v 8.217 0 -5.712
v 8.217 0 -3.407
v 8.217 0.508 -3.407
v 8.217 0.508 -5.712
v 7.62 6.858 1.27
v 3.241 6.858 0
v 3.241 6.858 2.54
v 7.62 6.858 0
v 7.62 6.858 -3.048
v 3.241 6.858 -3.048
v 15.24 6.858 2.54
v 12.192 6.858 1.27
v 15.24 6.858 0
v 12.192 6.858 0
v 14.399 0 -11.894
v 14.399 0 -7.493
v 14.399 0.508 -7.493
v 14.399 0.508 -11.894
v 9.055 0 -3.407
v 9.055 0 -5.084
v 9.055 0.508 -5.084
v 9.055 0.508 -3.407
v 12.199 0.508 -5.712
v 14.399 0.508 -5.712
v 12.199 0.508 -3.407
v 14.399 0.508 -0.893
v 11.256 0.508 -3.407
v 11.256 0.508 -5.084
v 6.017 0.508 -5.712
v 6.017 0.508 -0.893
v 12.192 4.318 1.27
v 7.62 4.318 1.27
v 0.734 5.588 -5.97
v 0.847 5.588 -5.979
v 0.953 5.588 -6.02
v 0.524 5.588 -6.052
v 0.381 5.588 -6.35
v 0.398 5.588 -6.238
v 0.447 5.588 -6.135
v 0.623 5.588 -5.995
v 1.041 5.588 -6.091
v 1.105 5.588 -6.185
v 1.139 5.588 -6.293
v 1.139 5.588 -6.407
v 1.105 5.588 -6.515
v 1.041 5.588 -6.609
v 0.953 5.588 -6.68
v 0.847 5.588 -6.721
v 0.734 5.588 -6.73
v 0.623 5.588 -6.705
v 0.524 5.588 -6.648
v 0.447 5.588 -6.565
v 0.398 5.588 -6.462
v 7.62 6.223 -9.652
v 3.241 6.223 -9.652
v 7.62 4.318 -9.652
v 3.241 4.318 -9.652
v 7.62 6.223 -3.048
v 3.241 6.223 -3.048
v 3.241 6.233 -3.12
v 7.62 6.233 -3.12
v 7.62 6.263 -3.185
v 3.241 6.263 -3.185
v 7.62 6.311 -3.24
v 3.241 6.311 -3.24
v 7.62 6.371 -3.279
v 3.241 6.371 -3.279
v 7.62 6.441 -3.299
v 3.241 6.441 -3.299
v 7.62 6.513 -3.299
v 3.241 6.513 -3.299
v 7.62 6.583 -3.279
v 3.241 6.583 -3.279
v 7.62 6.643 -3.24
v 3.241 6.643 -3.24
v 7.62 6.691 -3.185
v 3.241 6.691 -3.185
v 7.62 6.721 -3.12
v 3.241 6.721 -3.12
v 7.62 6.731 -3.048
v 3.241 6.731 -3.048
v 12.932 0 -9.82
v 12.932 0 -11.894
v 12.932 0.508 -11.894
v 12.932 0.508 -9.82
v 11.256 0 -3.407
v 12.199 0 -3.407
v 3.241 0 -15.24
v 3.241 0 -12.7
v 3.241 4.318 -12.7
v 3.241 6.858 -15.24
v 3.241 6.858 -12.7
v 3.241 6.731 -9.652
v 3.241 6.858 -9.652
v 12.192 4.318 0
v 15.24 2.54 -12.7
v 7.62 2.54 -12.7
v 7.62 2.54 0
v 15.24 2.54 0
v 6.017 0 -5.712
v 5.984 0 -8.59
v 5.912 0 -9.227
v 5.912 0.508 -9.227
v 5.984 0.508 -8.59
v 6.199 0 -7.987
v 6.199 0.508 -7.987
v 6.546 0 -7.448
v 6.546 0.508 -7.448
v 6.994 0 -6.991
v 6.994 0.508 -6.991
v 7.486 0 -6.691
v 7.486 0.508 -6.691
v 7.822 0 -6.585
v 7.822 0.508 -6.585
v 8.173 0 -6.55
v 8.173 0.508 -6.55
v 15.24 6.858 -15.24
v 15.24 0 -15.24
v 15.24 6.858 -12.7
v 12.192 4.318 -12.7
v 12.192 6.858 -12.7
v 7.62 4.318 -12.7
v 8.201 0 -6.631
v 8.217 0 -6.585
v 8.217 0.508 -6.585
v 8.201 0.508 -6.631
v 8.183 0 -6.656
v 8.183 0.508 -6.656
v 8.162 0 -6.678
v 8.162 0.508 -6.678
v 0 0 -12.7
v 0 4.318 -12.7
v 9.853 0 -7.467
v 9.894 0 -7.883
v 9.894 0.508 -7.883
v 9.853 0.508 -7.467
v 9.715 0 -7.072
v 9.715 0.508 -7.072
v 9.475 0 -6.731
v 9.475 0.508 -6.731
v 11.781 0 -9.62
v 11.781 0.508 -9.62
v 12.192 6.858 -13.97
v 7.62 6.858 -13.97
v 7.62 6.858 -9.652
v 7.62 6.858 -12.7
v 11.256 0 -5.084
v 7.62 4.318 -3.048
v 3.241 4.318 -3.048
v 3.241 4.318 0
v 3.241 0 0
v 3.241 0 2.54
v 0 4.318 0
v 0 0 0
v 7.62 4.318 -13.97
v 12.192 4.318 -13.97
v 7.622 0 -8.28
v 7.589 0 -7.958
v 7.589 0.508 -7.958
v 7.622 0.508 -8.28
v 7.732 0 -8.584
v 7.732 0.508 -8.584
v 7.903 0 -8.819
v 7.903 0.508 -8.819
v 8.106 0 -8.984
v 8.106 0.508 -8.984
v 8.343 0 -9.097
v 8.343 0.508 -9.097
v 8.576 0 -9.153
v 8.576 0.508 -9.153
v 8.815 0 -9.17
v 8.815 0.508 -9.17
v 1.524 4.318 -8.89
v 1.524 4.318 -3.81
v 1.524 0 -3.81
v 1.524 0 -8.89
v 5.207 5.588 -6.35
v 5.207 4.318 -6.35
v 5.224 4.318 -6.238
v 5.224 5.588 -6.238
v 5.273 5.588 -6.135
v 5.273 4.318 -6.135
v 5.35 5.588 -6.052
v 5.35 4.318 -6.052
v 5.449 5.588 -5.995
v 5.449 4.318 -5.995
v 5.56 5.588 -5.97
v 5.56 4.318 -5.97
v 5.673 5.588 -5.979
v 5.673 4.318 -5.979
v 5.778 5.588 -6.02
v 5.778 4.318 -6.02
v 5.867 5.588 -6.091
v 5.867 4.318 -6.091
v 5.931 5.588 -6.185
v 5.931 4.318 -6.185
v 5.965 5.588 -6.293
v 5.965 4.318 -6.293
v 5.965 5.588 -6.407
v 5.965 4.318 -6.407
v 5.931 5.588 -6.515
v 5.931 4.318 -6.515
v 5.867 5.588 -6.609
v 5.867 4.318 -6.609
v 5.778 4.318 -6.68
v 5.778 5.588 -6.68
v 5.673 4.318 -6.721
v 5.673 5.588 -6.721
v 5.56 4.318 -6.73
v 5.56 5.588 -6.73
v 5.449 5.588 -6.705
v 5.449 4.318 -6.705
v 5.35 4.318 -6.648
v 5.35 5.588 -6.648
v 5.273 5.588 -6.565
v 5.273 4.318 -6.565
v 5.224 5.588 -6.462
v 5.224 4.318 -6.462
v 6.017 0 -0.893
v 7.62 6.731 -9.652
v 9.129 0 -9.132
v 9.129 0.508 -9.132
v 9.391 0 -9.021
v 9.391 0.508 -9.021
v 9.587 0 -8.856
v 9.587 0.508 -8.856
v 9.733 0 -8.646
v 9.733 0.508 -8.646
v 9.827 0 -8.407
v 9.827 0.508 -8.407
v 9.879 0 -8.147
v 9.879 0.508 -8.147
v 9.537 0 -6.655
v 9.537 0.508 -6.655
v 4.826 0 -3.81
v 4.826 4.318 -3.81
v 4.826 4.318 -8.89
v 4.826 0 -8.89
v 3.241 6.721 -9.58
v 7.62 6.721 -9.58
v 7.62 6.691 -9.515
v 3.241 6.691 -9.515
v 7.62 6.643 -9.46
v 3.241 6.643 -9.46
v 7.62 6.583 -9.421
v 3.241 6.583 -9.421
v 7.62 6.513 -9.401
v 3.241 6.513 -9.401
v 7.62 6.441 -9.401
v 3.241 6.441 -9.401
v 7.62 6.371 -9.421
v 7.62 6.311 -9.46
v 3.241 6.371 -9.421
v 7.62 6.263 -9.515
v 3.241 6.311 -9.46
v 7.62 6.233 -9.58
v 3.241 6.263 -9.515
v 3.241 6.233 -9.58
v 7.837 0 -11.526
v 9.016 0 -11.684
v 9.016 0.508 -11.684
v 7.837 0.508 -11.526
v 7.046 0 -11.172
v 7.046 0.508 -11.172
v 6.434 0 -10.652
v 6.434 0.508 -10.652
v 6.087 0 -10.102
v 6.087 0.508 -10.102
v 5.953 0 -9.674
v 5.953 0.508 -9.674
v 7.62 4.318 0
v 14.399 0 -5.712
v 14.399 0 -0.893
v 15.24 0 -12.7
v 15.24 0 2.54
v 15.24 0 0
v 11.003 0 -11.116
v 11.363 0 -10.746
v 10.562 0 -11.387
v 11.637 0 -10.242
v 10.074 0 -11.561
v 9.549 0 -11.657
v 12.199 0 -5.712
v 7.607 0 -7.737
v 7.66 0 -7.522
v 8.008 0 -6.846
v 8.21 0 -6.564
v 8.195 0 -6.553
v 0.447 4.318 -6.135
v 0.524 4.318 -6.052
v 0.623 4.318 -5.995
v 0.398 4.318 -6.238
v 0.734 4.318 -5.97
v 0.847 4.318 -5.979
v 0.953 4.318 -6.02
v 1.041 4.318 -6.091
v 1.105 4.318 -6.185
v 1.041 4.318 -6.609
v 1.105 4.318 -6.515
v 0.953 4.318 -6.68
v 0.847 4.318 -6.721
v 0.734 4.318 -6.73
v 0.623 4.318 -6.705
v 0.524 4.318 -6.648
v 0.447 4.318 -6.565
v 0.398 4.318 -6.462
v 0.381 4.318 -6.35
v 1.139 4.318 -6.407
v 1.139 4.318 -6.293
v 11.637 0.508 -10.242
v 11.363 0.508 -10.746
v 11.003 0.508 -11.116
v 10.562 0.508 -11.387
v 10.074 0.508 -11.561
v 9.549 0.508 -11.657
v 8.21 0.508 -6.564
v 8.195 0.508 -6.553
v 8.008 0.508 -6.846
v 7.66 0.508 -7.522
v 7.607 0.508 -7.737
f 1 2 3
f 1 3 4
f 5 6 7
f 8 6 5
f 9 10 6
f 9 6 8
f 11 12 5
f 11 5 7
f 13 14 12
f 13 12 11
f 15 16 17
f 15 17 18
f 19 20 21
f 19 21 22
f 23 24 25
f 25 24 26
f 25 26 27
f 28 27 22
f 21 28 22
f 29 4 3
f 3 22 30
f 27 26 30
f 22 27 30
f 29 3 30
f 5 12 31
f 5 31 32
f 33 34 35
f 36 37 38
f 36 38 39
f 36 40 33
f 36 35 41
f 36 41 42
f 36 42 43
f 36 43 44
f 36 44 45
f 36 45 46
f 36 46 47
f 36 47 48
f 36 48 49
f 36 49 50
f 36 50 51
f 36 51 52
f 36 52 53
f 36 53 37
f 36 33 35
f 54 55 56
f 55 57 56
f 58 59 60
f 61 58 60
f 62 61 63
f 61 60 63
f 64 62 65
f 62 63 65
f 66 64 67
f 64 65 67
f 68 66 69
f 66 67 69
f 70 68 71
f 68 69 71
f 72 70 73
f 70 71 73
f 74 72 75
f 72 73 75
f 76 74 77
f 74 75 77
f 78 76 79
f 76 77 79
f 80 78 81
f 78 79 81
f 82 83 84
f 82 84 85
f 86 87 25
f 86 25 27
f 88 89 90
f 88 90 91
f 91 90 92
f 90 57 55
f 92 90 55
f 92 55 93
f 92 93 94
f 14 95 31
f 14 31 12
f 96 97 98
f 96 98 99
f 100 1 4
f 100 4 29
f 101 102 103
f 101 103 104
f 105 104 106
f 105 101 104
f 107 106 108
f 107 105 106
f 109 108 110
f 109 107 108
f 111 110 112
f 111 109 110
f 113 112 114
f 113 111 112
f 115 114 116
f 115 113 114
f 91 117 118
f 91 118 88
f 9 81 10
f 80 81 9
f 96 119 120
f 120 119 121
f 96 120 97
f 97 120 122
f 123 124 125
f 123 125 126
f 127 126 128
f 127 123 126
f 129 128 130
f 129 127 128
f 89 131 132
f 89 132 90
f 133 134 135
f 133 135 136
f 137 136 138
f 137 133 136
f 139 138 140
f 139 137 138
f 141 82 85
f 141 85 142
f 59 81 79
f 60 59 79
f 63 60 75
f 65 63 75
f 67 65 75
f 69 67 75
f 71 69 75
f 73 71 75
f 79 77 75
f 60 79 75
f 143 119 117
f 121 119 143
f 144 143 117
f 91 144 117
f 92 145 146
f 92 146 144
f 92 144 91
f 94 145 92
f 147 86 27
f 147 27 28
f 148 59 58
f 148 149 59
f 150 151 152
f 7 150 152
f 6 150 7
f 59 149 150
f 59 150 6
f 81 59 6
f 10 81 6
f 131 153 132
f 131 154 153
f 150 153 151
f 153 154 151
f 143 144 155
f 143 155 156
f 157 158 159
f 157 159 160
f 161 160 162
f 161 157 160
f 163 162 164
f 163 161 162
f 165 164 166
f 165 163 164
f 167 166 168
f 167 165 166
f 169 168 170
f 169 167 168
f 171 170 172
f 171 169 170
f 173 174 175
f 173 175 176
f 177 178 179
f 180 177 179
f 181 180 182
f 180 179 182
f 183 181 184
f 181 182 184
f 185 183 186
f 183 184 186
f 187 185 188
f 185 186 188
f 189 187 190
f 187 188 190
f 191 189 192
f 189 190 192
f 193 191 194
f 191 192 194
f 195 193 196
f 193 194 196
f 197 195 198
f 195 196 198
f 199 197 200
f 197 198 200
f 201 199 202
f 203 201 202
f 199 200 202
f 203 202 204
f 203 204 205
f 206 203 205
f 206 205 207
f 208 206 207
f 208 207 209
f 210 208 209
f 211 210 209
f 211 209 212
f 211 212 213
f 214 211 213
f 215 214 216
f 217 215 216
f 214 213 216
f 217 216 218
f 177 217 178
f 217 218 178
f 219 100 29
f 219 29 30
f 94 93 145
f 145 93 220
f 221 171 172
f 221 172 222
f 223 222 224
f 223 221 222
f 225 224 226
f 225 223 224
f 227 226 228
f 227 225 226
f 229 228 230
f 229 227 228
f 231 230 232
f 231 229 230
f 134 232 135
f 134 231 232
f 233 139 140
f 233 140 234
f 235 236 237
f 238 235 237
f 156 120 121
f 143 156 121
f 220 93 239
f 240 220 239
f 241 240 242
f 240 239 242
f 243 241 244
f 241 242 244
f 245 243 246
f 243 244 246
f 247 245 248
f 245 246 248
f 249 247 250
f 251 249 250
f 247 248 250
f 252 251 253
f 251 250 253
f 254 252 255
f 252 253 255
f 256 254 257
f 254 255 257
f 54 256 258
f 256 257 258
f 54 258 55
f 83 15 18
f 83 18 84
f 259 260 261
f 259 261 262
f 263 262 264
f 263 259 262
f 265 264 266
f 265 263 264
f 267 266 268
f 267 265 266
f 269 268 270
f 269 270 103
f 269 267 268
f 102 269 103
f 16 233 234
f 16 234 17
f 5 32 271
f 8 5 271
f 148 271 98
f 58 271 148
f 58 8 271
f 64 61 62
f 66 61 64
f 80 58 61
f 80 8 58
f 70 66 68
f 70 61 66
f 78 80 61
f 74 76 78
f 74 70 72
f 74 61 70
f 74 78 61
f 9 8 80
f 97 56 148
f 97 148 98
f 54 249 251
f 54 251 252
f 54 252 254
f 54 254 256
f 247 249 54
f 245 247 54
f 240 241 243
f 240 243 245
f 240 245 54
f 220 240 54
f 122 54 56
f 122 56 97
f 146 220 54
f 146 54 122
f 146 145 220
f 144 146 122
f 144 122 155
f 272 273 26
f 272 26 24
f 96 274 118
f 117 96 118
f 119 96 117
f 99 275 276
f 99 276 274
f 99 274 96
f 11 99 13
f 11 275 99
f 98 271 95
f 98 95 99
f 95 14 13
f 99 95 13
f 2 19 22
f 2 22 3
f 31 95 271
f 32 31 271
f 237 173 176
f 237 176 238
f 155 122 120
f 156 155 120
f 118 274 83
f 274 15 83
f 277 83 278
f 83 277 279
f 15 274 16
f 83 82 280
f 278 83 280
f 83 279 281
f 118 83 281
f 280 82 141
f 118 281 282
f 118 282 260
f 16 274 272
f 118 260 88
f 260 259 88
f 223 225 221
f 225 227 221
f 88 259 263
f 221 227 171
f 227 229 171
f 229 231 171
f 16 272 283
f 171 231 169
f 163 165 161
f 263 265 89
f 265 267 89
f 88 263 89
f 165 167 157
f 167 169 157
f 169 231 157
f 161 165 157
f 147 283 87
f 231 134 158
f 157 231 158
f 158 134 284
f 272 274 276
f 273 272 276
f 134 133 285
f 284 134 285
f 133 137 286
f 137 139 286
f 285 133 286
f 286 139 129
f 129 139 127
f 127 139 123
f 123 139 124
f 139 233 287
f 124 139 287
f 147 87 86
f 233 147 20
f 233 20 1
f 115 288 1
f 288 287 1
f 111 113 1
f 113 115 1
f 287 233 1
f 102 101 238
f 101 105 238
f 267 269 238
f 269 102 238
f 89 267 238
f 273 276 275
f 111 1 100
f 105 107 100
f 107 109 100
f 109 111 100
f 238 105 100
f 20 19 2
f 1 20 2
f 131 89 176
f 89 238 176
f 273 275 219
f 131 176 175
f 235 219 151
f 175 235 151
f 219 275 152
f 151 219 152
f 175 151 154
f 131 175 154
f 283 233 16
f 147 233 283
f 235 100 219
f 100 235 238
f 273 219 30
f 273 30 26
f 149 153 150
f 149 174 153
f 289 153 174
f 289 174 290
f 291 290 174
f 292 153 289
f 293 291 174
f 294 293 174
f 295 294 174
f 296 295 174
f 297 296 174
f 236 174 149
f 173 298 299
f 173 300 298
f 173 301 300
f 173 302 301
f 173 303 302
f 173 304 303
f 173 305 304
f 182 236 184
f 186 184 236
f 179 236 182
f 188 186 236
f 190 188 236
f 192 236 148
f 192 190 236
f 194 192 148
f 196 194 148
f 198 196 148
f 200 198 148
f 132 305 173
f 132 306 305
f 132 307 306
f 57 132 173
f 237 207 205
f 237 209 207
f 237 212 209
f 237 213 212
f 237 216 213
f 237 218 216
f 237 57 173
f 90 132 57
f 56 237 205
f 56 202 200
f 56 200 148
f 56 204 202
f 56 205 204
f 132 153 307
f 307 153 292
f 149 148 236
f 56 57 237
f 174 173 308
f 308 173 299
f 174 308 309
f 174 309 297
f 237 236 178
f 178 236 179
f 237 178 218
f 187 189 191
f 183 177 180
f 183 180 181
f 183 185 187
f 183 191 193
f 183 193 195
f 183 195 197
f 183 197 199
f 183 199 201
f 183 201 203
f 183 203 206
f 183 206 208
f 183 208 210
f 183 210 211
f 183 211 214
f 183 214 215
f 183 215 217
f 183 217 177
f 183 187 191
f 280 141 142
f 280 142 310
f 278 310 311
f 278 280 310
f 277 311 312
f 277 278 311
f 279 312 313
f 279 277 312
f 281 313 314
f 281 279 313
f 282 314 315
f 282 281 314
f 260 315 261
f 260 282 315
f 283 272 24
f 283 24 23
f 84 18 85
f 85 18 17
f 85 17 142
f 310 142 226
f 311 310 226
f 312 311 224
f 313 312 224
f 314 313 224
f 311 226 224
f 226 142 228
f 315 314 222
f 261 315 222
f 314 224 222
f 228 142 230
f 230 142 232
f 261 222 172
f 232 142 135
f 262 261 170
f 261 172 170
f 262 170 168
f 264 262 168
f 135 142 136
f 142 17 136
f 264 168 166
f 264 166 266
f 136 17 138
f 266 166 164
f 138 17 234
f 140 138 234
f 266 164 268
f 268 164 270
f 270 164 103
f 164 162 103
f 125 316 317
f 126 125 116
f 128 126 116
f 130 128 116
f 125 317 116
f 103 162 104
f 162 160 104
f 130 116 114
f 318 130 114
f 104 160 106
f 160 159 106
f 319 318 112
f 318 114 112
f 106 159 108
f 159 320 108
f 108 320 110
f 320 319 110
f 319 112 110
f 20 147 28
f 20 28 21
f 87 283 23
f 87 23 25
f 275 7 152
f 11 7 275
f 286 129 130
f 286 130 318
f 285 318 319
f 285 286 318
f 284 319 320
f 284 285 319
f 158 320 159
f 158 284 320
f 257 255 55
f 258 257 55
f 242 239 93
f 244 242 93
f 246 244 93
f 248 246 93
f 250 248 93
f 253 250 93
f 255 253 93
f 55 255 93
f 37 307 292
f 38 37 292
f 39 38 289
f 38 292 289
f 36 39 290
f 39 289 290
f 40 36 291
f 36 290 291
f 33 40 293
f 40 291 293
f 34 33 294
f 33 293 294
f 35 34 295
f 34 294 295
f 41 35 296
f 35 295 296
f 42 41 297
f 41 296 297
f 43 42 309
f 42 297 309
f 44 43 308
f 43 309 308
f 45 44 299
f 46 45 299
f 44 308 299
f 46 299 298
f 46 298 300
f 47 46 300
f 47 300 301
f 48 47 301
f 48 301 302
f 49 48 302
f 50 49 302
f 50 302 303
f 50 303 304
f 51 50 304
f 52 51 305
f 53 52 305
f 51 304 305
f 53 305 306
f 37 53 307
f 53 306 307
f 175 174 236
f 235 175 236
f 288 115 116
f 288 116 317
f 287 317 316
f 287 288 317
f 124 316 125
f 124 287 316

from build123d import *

# Parameters (mm, degrees)
SKETCH1_W             = 15.24
SKETCH1_H             = 12.7
MAIN_BASE_DEPTH       = 2.54
ALIGNMENTPINS_START   = 1.778
SKETCH2_R             = 0.381
ALIGNMENTPINS_DEPTH   = 1.27
ALIGNMENTPINS_2_DEPTH = 1.27
SKETCH7_W             = 7.62
SKETCH7_H             = 12.7
PCBOARDEDGES_DEPTH    = 1.778
SKETCH12_W            = 4.379010271
SKETCH12_H            = 3.048
CONNECTORALIGN_DEPTH  = 2.54
SKETCH13_W            = 3.302
SKETCH13_H            = 5.08
LEDHOLE_DEPTH         = 5.318
SKETCH14_W            = 11.999010271
SKETCH14_H            = 6.858
SHOULDER_DEPTH        = 2.54
SKETCH15_W            = 11.999010271
SKETCH15_H            = 6.858
SHOULDER2_DEPTH       = 2.54
PCB_CLIP_START        = -4.37901
SKETCH17_R            = 0.254
PCB_CLIP_DEPTH        = 4.37901
SKETCH18_W            = 4.572
SKETCH18_H            = 2.54
NUNCHUCKCLIP_DEPTH    = 1.27
SKETCH19_W            = 4.572
SKETCH19_H            = 2.54
NUNCHUCKCLIP2_DEPTH   = 1.27
CUT_EXTRUDE1_DEPTH    = 0.508


with BuildPart() as part:
    # Sketch1 → Main Base (new body)
    with BuildSketch(Plane(origin=(0, 0, 0), x_dir=(1, 0, 0), z_dir=(0, 1, 0))):
        with Locations((7.62, 6.35)):
            Rectangle(SKETCH1_W, SKETCH1_H)
    extrude(amount=MAIN_BASE_DEPTH)



with BuildPart() as body_2:
    # Sketch2 → AlignmentPins (new body)
    with BuildSketch(Plane(origin=(0, 2.54, 0), x_dir=(-1, 0, 0), z_dir=(0, 1, 0)).offset(ALIGNMENTPINS_START)):
        with Locations((-0.762, -6.35)):
            Circle(SKETCH2_R)
    extrude(amount=ALIGNMENTPINS_DEPTH)


with BuildPart() as body_3:
    # Sketch2 → AlignmentPins 2 (new body)
    with BuildSketch(Plane(origin=(0, 2.54, 0), x_dir=(-1, 0, 0), z_dir=(0, 1, 0)).offset(ALIGNMENTPINS_START)):
        with Locations((-5.588, -6.35)):
            Circle(SKETCH2_R)
    extrude(amount=ALIGNMENTPINS_2_DEPTH)


with BuildPart() as part_1:
    add(part.part)

    add(body_2.part)  # PCBoardEdges merges body 2

    add(body_3.part)  # PCBoardEdges merges body 3
    # Sketch7 → PCBoardEdges (add)
    with BuildSketch(Plane(origin=(0, 2.54, 0), x_dir=(1, 0, 0), z_dir=(0, 1, 0))):
        with Locations((3.81, 6.35)):
            Rectangle(SKETCH7_W, SKETCH7_H)
    extrude(amount=PCBOARDEDGES_DEPTH)

    # Sketch12 → ConnectorAlign (add)
    with BuildSketch(Plane(origin=(0, 4.318, 0), x_dir=(1, 0, 0), z_dir=(0, 1, 0))):
        with Locations((5.430494864, 1.524)):
            Rectangle(SKETCH12_W, SKETCH12_H)
        with Locations((5.430494864, 11.176)):
            Rectangle(SKETCH12_W, SKETCH12_H)
    extrude(amount=CONNECTORALIGN_DEPTH)

    # Sketch13 → LEDHole (cut, through all)
    with BuildSketch(Plane(origin=(0, 4.318, 0), x_dir=(1, 0, 0), z_dir=(0, 1, 0))):
        with Locations((3.175, 6.35)):
            Rectangle(SKETCH13_W, SKETCH13_H)
    extrude(amount=-LEDHOLE_DEPTH, mode=Mode.SUBTRACT)

    # Sketch14 → Shoulder (add)
    with BuildSketch(Plane.XY):
        with Locations((9.240494865, 3.429)):
            Rectangle(SKETCH14_W, SKETCH14_H)
    extrude(amount=SHOULDER_DEPTH)

    # Sketch15 → Shoulder2 (add)
    with BuildSketch(Plane(origin=(0, 0, -12.7), x_dir=(-1, 0, 0), z_dir=(0, 0, -1))):
        with Locations((-9.240494865, 3.429)):
            Rectangle(SKETCH15_W, SKETCH15_H)
    extrude(amount=SHOULDER2_DEPTH)

    # Sketch17 → PCB_Clip (add)
    with BuildSketch(Plane(origin=(7.62, 0, 0), x_dir=(0, 0, -1), z_dir=(1, 0, 0)).offset(PCB_CLIP_START)):
        with Locations((3.048, 6.477)):
            Circle(SKETCH17_R)
        with Locations((9.652, 6.477)):
            Circle(SKETCH17_R)
    extrude(amount=PCB_CLIP_DEPTH)

    # Sketch18 → NunchuckClip (cut)
    with BuildSketch(Plane(origin=(0, 0, 0), x_dir=(-1, 0, 0), z_dir=(0, 0, -1))):
        with Locations((-9.906, 5.588)):
            Rectangle(SKETCH18_W, SKETCH18_H)
    extrude(amount=-NUNCHUCKCLIP_DEPTH, mode=Mode.SUBTRACT)

    # Sketch19 → NunchuckClip2 (cut)
    with BuildSketch(Plane.XY.offset(-12.7)):
        with Locations((9.906, 5.588)):
            Rectangle(SKETCH19_W, SKETCH19_H)
    extrude(amount=-NUNCHUCKCLIP2_DEPTH, mode=Mode.SUBTRACT)

    # Sketch20 → Cut-Extrude1 (cut)
    with BuildSketch(Plane.XZ):
        Polygon((8.217257779, -3.407193662), (8.217257779, -5.712243662), (6.016982779, -5.712243662), (6.016982779, -0.892593662), (14.398982779, -0.892593662), (14.398982779, -5.712243662), (12.198707779, -5.712243662), (12.198707779, -3.407193662), (11.255732779, -3.407193662), (11.255732779, -5.083593662), (9.055457779, -5.083593662), (9.055457779, -3.407193662), align=None)
        with BuildLine():
            Line((14.398982779, -7.493418662), (14.398982779, -11.893968662))
            Line((14.398982779, -11.893968662), (12.932132779, -11.893968662))
            Line((12.932132779, -11.893968662), (12.932132779, -9.819751084))
            Line((12.932132779, -9.819751084), (11.781244888, -9.62002374))
            add(Edge.make_bspline(
                [(11.781244888, -9.62002374), (11.770251243, -9.701615614), (11.748663963, -9.861830588), (11.690486481, -10.092391141), (11.615599165, -10.308891021), (11.520125231, -10.50985122), (11.405471862, -10.695560634), (11.270958242, -10.865311588), (11.120486873, -11.022229739), (10.949196623, -11.16103415), (10.761135353, -11.283987594), (10.557944594, -11.392930954), (10.337872373, -11.481879106), (10.102990479, -11.555971833), (9.853586477, -11.614857534), (9.588035638, -11.655012226), (9.307512918, -11.680069087), (9.114994844, -11.682943238), (9.016167154, -11.684418662)],
                knots=[0, 0, 0, 0, 0.000246818, 0.000484656, 0.000711955, 0.000933104, 0.001150717, 0.001365234, 0.001581735, 0.001801627, 0.002025024, 0.00225499, 0.002492123, 0.002735986, 0.002993304, 0.003260037, 0.003541058, 0.003837488, 0.003837488, 0.003837488, 0.003837488], degree=3))
            add(Edge.make_bspline(
                [(9.016167154, -11.684418662), (8.905845682, -11.682210565), (8.68961718, -11.677882727), (8.372872854, -11.644171577), (8.070289394, -11.591506566), (7.783499686, -11.513120981), (7.50963283, -11.418624818), (7.253853676, -11.294705499), (7.009895928, -11.155322531), (6.785472567, -10.99155228), (6.581476114, -10.81250602), (6.401376691, -10.621361865), (6.251345496, -10.416180814), (6.127577636, -10.200488598), (6.029896075, -9.973283881), (5.961530212, -9.734567465), (5.918899529, -9.48458455), (5.914467439, -9.314058562), (5.912207779, -9.22711749)],
                knots=[0, 0, 0, 0, 0.000330895, 0.000648549, 0.000954583, 0.00125123, 0.001539645, 0.00182231, 0.002102538, 0.002381539, 0.002654132, 0.002915916, 0.003167717, 0.003414839, 0.003660542, 0.00390768, 0.004158249, 0.004418878, 0.004418878, 0.004418878, 0.004418878], degree=3))
            add(Edge.make_bspline(
                [(5.912207779, -9.22711749), (5.91445515, -9.141879038), (5.918894654, -8.973497236), (5.952975516, -8.724244798), (6.006861153, -8.48157511), (6.081680985, -8.244815631), (6.181740166, -8.016042881), (6.300749021, -7.793180228), (6.443204901, -7.577175879), (6.60469356, -7.3712837), (6.778629295, -7.179505186), (6.962203599, -7.01236275), (7.15024709, -6.869703261), (7.343165184, -6.752025997), (7.544148349, -6.663616031), (7.748263448, -6.596817328), (7.959336029, -6.558322833), (8.101419593, -6.553084662), (8.173055826, -6.550443662)],
                knots=[0, 0, 0, 0, 0.000255646, 0.000505008, 0.000753251, 0.00100073, 0.001248584, 0.001501277, 0.001757823, 0.002023741, 0.002285618, 0.002533617, 0.002767397, 0.002992849, 0.00320977, 0.003424631, 0.003635926, 0.003850787, 0.003850787, 0.003850787, 0.003850787], degree=3))
            add(Edge.make_bspline(
                [(8.173055826, -6.550443662), (8.185703613, -6.55112084), (8.209065854, -6.552371684), (8.21468206, -6.574619572), (8.217257779, -6.584822959)],
                knots=[0, 0, 0, 0, 3.375e-05, 6.2341e-05, 6.2341e-05, 6.2341e-05, 6.2341e-05], degree=3))
            add(Edge.make_bspline(
                [(8.217257779, -6.584822959), (8.21379986, -6.598956726), (8.204910316, -6.635291506), (8.178023964, -6.661887625), (8.16159606, -6.678138193)],
                knots=[0, 0, 0, 0, 4.2972e-05, 0.000110472, 0.000110472, 0.000110472, 0.000110472], degree=3))
            add(Edge.make_bspline(
                [(8.16159606, -6.678138193), (8.136365772, -6.700405265), (8.077016572, -6.752784095), (7.993692338, -6.862131275), (7.902122779, -7.009388757), (7.800385555, -7.184339204), (7.708056874, -7.377085557), (7.639849213, -7.574659381), (7.596386201, -7.767637982), (7.591153517, -7.895938561), (7.588607779, -7.958357724)],
                knots=[0, 0, 0, 0, 0.000100772, 0.000237046, 0.000410069, 0.00062125, 0.000843879, 0.001049934, 0.0012474, 0.00143449, 0.00143449, 0.00143449, 0.00143449], degree=3))
            add(Edge.make_bspline(
                [(7.588607779, -7.958357724), (7.589364169, -8.003161205), (7.590845457, -8.090902724), (7.607861397, -8.218508769), (7.633961608, -8.339043342), (7.670022293, -8.453352628), (7.717335918, -8.560860294), (7.774738157, -8.661469601), (7.843243248, -8.754458019), (7.920801372, -8.840377114), (8.008056037, -8.917894183), (8.103416935, -8.984707761), (8.204925166, -9.042944891), (8.314460725, -9.087724989), (8.428623769, -9.127224479), (8.551689353, -9.149790175), (8.680576304, -9.167789672), (8.76943719, -9.169132909), (8.814802701, -9.169818662)],
                knots=[0, 0, 0, 0, 0.000134333, 0.000263072, 0.000385418, 0.000503982, 0.000622001, 0.000737136, 0.000850758, 0.00096782, 0.00108379, 0.001200071, 0.001316628, 0.001433998, 0.001554623, 0.001678233, 0.001808597, 0.001944566, 0.001944566, 0.001944566, 0.001944566], degree=3))
            add(Edge.make_bspline(
                [(8.814802701, -9.169818662), (8.855799497, -9.169091152), (8.935958333, -9.16766869), (9.052576868, -9.150249952), (9.16328584, -9.125037681), (9.265814181, -9.086505827), (9.363252497, -9.041250504), (9.451262049, -8.981147756), (9.533643551, -8.912152178), (9.609276284, -8.833428845), (9.67666913, -8.744332428), (9.73502713, -8.646476727), (9.785210532, -8.540365748), (9.823615634, -8.425214765), (9.85492271, -8.301566212), (9.87766612, -8.169699968), (9.890636219, -8.029012368), (9.892629227, -7.932736654), (9.893657779, -7.883050693)],
                knots=[0, 0, 0, 0, 0.000122881, 0.000240263, 0.000353034, 0.00046283, 0.000568268, 0.000674516, 0.000781419, 0.000890259, 0.001001257, 0.001115807, 0.001231522, 0.001352668, 0.00147933, 0.001613902, 0.001753672, 0.001902729, 0.001902729, 0.001902729, 0.001902729], degree=3))
            add(Edge.make_bspline(
                [(9.893657779, -7.883050693), (9.892472166, -7.825689716), (9.890150122, -7.713347192), (9.869778513, -7.548529099), (9.837864771, -7.391618982), (9.791184949, -7.242714697), (9.733050352, -7.101808236), (9.65950445, -6.969728078), (9.575093218, -6.844330987), (9.508174474, -6.768579517), (9.474557779, -6.730525693)],
                knots=[0, 0, 0, 0, 0.000172021, 0.000336907, 0.000497444, 0.000651749, 0.000804378, 0.000953849, 0.001104606, 0.001256786, 0.001256786, 0.001256786, 0.001256786], degree=3))
            Line((9.474557779, -6.730525693), (9.536767935, -6.655218662))
            Line((9.536767935, -6.655218662), (14.398982779, -7.493418662))
        make_face()
    extrude(amount=-CUT_EXTRUDE1_DEPTH, mode=Mode.SUBTRACT)


solid = part_1.part
